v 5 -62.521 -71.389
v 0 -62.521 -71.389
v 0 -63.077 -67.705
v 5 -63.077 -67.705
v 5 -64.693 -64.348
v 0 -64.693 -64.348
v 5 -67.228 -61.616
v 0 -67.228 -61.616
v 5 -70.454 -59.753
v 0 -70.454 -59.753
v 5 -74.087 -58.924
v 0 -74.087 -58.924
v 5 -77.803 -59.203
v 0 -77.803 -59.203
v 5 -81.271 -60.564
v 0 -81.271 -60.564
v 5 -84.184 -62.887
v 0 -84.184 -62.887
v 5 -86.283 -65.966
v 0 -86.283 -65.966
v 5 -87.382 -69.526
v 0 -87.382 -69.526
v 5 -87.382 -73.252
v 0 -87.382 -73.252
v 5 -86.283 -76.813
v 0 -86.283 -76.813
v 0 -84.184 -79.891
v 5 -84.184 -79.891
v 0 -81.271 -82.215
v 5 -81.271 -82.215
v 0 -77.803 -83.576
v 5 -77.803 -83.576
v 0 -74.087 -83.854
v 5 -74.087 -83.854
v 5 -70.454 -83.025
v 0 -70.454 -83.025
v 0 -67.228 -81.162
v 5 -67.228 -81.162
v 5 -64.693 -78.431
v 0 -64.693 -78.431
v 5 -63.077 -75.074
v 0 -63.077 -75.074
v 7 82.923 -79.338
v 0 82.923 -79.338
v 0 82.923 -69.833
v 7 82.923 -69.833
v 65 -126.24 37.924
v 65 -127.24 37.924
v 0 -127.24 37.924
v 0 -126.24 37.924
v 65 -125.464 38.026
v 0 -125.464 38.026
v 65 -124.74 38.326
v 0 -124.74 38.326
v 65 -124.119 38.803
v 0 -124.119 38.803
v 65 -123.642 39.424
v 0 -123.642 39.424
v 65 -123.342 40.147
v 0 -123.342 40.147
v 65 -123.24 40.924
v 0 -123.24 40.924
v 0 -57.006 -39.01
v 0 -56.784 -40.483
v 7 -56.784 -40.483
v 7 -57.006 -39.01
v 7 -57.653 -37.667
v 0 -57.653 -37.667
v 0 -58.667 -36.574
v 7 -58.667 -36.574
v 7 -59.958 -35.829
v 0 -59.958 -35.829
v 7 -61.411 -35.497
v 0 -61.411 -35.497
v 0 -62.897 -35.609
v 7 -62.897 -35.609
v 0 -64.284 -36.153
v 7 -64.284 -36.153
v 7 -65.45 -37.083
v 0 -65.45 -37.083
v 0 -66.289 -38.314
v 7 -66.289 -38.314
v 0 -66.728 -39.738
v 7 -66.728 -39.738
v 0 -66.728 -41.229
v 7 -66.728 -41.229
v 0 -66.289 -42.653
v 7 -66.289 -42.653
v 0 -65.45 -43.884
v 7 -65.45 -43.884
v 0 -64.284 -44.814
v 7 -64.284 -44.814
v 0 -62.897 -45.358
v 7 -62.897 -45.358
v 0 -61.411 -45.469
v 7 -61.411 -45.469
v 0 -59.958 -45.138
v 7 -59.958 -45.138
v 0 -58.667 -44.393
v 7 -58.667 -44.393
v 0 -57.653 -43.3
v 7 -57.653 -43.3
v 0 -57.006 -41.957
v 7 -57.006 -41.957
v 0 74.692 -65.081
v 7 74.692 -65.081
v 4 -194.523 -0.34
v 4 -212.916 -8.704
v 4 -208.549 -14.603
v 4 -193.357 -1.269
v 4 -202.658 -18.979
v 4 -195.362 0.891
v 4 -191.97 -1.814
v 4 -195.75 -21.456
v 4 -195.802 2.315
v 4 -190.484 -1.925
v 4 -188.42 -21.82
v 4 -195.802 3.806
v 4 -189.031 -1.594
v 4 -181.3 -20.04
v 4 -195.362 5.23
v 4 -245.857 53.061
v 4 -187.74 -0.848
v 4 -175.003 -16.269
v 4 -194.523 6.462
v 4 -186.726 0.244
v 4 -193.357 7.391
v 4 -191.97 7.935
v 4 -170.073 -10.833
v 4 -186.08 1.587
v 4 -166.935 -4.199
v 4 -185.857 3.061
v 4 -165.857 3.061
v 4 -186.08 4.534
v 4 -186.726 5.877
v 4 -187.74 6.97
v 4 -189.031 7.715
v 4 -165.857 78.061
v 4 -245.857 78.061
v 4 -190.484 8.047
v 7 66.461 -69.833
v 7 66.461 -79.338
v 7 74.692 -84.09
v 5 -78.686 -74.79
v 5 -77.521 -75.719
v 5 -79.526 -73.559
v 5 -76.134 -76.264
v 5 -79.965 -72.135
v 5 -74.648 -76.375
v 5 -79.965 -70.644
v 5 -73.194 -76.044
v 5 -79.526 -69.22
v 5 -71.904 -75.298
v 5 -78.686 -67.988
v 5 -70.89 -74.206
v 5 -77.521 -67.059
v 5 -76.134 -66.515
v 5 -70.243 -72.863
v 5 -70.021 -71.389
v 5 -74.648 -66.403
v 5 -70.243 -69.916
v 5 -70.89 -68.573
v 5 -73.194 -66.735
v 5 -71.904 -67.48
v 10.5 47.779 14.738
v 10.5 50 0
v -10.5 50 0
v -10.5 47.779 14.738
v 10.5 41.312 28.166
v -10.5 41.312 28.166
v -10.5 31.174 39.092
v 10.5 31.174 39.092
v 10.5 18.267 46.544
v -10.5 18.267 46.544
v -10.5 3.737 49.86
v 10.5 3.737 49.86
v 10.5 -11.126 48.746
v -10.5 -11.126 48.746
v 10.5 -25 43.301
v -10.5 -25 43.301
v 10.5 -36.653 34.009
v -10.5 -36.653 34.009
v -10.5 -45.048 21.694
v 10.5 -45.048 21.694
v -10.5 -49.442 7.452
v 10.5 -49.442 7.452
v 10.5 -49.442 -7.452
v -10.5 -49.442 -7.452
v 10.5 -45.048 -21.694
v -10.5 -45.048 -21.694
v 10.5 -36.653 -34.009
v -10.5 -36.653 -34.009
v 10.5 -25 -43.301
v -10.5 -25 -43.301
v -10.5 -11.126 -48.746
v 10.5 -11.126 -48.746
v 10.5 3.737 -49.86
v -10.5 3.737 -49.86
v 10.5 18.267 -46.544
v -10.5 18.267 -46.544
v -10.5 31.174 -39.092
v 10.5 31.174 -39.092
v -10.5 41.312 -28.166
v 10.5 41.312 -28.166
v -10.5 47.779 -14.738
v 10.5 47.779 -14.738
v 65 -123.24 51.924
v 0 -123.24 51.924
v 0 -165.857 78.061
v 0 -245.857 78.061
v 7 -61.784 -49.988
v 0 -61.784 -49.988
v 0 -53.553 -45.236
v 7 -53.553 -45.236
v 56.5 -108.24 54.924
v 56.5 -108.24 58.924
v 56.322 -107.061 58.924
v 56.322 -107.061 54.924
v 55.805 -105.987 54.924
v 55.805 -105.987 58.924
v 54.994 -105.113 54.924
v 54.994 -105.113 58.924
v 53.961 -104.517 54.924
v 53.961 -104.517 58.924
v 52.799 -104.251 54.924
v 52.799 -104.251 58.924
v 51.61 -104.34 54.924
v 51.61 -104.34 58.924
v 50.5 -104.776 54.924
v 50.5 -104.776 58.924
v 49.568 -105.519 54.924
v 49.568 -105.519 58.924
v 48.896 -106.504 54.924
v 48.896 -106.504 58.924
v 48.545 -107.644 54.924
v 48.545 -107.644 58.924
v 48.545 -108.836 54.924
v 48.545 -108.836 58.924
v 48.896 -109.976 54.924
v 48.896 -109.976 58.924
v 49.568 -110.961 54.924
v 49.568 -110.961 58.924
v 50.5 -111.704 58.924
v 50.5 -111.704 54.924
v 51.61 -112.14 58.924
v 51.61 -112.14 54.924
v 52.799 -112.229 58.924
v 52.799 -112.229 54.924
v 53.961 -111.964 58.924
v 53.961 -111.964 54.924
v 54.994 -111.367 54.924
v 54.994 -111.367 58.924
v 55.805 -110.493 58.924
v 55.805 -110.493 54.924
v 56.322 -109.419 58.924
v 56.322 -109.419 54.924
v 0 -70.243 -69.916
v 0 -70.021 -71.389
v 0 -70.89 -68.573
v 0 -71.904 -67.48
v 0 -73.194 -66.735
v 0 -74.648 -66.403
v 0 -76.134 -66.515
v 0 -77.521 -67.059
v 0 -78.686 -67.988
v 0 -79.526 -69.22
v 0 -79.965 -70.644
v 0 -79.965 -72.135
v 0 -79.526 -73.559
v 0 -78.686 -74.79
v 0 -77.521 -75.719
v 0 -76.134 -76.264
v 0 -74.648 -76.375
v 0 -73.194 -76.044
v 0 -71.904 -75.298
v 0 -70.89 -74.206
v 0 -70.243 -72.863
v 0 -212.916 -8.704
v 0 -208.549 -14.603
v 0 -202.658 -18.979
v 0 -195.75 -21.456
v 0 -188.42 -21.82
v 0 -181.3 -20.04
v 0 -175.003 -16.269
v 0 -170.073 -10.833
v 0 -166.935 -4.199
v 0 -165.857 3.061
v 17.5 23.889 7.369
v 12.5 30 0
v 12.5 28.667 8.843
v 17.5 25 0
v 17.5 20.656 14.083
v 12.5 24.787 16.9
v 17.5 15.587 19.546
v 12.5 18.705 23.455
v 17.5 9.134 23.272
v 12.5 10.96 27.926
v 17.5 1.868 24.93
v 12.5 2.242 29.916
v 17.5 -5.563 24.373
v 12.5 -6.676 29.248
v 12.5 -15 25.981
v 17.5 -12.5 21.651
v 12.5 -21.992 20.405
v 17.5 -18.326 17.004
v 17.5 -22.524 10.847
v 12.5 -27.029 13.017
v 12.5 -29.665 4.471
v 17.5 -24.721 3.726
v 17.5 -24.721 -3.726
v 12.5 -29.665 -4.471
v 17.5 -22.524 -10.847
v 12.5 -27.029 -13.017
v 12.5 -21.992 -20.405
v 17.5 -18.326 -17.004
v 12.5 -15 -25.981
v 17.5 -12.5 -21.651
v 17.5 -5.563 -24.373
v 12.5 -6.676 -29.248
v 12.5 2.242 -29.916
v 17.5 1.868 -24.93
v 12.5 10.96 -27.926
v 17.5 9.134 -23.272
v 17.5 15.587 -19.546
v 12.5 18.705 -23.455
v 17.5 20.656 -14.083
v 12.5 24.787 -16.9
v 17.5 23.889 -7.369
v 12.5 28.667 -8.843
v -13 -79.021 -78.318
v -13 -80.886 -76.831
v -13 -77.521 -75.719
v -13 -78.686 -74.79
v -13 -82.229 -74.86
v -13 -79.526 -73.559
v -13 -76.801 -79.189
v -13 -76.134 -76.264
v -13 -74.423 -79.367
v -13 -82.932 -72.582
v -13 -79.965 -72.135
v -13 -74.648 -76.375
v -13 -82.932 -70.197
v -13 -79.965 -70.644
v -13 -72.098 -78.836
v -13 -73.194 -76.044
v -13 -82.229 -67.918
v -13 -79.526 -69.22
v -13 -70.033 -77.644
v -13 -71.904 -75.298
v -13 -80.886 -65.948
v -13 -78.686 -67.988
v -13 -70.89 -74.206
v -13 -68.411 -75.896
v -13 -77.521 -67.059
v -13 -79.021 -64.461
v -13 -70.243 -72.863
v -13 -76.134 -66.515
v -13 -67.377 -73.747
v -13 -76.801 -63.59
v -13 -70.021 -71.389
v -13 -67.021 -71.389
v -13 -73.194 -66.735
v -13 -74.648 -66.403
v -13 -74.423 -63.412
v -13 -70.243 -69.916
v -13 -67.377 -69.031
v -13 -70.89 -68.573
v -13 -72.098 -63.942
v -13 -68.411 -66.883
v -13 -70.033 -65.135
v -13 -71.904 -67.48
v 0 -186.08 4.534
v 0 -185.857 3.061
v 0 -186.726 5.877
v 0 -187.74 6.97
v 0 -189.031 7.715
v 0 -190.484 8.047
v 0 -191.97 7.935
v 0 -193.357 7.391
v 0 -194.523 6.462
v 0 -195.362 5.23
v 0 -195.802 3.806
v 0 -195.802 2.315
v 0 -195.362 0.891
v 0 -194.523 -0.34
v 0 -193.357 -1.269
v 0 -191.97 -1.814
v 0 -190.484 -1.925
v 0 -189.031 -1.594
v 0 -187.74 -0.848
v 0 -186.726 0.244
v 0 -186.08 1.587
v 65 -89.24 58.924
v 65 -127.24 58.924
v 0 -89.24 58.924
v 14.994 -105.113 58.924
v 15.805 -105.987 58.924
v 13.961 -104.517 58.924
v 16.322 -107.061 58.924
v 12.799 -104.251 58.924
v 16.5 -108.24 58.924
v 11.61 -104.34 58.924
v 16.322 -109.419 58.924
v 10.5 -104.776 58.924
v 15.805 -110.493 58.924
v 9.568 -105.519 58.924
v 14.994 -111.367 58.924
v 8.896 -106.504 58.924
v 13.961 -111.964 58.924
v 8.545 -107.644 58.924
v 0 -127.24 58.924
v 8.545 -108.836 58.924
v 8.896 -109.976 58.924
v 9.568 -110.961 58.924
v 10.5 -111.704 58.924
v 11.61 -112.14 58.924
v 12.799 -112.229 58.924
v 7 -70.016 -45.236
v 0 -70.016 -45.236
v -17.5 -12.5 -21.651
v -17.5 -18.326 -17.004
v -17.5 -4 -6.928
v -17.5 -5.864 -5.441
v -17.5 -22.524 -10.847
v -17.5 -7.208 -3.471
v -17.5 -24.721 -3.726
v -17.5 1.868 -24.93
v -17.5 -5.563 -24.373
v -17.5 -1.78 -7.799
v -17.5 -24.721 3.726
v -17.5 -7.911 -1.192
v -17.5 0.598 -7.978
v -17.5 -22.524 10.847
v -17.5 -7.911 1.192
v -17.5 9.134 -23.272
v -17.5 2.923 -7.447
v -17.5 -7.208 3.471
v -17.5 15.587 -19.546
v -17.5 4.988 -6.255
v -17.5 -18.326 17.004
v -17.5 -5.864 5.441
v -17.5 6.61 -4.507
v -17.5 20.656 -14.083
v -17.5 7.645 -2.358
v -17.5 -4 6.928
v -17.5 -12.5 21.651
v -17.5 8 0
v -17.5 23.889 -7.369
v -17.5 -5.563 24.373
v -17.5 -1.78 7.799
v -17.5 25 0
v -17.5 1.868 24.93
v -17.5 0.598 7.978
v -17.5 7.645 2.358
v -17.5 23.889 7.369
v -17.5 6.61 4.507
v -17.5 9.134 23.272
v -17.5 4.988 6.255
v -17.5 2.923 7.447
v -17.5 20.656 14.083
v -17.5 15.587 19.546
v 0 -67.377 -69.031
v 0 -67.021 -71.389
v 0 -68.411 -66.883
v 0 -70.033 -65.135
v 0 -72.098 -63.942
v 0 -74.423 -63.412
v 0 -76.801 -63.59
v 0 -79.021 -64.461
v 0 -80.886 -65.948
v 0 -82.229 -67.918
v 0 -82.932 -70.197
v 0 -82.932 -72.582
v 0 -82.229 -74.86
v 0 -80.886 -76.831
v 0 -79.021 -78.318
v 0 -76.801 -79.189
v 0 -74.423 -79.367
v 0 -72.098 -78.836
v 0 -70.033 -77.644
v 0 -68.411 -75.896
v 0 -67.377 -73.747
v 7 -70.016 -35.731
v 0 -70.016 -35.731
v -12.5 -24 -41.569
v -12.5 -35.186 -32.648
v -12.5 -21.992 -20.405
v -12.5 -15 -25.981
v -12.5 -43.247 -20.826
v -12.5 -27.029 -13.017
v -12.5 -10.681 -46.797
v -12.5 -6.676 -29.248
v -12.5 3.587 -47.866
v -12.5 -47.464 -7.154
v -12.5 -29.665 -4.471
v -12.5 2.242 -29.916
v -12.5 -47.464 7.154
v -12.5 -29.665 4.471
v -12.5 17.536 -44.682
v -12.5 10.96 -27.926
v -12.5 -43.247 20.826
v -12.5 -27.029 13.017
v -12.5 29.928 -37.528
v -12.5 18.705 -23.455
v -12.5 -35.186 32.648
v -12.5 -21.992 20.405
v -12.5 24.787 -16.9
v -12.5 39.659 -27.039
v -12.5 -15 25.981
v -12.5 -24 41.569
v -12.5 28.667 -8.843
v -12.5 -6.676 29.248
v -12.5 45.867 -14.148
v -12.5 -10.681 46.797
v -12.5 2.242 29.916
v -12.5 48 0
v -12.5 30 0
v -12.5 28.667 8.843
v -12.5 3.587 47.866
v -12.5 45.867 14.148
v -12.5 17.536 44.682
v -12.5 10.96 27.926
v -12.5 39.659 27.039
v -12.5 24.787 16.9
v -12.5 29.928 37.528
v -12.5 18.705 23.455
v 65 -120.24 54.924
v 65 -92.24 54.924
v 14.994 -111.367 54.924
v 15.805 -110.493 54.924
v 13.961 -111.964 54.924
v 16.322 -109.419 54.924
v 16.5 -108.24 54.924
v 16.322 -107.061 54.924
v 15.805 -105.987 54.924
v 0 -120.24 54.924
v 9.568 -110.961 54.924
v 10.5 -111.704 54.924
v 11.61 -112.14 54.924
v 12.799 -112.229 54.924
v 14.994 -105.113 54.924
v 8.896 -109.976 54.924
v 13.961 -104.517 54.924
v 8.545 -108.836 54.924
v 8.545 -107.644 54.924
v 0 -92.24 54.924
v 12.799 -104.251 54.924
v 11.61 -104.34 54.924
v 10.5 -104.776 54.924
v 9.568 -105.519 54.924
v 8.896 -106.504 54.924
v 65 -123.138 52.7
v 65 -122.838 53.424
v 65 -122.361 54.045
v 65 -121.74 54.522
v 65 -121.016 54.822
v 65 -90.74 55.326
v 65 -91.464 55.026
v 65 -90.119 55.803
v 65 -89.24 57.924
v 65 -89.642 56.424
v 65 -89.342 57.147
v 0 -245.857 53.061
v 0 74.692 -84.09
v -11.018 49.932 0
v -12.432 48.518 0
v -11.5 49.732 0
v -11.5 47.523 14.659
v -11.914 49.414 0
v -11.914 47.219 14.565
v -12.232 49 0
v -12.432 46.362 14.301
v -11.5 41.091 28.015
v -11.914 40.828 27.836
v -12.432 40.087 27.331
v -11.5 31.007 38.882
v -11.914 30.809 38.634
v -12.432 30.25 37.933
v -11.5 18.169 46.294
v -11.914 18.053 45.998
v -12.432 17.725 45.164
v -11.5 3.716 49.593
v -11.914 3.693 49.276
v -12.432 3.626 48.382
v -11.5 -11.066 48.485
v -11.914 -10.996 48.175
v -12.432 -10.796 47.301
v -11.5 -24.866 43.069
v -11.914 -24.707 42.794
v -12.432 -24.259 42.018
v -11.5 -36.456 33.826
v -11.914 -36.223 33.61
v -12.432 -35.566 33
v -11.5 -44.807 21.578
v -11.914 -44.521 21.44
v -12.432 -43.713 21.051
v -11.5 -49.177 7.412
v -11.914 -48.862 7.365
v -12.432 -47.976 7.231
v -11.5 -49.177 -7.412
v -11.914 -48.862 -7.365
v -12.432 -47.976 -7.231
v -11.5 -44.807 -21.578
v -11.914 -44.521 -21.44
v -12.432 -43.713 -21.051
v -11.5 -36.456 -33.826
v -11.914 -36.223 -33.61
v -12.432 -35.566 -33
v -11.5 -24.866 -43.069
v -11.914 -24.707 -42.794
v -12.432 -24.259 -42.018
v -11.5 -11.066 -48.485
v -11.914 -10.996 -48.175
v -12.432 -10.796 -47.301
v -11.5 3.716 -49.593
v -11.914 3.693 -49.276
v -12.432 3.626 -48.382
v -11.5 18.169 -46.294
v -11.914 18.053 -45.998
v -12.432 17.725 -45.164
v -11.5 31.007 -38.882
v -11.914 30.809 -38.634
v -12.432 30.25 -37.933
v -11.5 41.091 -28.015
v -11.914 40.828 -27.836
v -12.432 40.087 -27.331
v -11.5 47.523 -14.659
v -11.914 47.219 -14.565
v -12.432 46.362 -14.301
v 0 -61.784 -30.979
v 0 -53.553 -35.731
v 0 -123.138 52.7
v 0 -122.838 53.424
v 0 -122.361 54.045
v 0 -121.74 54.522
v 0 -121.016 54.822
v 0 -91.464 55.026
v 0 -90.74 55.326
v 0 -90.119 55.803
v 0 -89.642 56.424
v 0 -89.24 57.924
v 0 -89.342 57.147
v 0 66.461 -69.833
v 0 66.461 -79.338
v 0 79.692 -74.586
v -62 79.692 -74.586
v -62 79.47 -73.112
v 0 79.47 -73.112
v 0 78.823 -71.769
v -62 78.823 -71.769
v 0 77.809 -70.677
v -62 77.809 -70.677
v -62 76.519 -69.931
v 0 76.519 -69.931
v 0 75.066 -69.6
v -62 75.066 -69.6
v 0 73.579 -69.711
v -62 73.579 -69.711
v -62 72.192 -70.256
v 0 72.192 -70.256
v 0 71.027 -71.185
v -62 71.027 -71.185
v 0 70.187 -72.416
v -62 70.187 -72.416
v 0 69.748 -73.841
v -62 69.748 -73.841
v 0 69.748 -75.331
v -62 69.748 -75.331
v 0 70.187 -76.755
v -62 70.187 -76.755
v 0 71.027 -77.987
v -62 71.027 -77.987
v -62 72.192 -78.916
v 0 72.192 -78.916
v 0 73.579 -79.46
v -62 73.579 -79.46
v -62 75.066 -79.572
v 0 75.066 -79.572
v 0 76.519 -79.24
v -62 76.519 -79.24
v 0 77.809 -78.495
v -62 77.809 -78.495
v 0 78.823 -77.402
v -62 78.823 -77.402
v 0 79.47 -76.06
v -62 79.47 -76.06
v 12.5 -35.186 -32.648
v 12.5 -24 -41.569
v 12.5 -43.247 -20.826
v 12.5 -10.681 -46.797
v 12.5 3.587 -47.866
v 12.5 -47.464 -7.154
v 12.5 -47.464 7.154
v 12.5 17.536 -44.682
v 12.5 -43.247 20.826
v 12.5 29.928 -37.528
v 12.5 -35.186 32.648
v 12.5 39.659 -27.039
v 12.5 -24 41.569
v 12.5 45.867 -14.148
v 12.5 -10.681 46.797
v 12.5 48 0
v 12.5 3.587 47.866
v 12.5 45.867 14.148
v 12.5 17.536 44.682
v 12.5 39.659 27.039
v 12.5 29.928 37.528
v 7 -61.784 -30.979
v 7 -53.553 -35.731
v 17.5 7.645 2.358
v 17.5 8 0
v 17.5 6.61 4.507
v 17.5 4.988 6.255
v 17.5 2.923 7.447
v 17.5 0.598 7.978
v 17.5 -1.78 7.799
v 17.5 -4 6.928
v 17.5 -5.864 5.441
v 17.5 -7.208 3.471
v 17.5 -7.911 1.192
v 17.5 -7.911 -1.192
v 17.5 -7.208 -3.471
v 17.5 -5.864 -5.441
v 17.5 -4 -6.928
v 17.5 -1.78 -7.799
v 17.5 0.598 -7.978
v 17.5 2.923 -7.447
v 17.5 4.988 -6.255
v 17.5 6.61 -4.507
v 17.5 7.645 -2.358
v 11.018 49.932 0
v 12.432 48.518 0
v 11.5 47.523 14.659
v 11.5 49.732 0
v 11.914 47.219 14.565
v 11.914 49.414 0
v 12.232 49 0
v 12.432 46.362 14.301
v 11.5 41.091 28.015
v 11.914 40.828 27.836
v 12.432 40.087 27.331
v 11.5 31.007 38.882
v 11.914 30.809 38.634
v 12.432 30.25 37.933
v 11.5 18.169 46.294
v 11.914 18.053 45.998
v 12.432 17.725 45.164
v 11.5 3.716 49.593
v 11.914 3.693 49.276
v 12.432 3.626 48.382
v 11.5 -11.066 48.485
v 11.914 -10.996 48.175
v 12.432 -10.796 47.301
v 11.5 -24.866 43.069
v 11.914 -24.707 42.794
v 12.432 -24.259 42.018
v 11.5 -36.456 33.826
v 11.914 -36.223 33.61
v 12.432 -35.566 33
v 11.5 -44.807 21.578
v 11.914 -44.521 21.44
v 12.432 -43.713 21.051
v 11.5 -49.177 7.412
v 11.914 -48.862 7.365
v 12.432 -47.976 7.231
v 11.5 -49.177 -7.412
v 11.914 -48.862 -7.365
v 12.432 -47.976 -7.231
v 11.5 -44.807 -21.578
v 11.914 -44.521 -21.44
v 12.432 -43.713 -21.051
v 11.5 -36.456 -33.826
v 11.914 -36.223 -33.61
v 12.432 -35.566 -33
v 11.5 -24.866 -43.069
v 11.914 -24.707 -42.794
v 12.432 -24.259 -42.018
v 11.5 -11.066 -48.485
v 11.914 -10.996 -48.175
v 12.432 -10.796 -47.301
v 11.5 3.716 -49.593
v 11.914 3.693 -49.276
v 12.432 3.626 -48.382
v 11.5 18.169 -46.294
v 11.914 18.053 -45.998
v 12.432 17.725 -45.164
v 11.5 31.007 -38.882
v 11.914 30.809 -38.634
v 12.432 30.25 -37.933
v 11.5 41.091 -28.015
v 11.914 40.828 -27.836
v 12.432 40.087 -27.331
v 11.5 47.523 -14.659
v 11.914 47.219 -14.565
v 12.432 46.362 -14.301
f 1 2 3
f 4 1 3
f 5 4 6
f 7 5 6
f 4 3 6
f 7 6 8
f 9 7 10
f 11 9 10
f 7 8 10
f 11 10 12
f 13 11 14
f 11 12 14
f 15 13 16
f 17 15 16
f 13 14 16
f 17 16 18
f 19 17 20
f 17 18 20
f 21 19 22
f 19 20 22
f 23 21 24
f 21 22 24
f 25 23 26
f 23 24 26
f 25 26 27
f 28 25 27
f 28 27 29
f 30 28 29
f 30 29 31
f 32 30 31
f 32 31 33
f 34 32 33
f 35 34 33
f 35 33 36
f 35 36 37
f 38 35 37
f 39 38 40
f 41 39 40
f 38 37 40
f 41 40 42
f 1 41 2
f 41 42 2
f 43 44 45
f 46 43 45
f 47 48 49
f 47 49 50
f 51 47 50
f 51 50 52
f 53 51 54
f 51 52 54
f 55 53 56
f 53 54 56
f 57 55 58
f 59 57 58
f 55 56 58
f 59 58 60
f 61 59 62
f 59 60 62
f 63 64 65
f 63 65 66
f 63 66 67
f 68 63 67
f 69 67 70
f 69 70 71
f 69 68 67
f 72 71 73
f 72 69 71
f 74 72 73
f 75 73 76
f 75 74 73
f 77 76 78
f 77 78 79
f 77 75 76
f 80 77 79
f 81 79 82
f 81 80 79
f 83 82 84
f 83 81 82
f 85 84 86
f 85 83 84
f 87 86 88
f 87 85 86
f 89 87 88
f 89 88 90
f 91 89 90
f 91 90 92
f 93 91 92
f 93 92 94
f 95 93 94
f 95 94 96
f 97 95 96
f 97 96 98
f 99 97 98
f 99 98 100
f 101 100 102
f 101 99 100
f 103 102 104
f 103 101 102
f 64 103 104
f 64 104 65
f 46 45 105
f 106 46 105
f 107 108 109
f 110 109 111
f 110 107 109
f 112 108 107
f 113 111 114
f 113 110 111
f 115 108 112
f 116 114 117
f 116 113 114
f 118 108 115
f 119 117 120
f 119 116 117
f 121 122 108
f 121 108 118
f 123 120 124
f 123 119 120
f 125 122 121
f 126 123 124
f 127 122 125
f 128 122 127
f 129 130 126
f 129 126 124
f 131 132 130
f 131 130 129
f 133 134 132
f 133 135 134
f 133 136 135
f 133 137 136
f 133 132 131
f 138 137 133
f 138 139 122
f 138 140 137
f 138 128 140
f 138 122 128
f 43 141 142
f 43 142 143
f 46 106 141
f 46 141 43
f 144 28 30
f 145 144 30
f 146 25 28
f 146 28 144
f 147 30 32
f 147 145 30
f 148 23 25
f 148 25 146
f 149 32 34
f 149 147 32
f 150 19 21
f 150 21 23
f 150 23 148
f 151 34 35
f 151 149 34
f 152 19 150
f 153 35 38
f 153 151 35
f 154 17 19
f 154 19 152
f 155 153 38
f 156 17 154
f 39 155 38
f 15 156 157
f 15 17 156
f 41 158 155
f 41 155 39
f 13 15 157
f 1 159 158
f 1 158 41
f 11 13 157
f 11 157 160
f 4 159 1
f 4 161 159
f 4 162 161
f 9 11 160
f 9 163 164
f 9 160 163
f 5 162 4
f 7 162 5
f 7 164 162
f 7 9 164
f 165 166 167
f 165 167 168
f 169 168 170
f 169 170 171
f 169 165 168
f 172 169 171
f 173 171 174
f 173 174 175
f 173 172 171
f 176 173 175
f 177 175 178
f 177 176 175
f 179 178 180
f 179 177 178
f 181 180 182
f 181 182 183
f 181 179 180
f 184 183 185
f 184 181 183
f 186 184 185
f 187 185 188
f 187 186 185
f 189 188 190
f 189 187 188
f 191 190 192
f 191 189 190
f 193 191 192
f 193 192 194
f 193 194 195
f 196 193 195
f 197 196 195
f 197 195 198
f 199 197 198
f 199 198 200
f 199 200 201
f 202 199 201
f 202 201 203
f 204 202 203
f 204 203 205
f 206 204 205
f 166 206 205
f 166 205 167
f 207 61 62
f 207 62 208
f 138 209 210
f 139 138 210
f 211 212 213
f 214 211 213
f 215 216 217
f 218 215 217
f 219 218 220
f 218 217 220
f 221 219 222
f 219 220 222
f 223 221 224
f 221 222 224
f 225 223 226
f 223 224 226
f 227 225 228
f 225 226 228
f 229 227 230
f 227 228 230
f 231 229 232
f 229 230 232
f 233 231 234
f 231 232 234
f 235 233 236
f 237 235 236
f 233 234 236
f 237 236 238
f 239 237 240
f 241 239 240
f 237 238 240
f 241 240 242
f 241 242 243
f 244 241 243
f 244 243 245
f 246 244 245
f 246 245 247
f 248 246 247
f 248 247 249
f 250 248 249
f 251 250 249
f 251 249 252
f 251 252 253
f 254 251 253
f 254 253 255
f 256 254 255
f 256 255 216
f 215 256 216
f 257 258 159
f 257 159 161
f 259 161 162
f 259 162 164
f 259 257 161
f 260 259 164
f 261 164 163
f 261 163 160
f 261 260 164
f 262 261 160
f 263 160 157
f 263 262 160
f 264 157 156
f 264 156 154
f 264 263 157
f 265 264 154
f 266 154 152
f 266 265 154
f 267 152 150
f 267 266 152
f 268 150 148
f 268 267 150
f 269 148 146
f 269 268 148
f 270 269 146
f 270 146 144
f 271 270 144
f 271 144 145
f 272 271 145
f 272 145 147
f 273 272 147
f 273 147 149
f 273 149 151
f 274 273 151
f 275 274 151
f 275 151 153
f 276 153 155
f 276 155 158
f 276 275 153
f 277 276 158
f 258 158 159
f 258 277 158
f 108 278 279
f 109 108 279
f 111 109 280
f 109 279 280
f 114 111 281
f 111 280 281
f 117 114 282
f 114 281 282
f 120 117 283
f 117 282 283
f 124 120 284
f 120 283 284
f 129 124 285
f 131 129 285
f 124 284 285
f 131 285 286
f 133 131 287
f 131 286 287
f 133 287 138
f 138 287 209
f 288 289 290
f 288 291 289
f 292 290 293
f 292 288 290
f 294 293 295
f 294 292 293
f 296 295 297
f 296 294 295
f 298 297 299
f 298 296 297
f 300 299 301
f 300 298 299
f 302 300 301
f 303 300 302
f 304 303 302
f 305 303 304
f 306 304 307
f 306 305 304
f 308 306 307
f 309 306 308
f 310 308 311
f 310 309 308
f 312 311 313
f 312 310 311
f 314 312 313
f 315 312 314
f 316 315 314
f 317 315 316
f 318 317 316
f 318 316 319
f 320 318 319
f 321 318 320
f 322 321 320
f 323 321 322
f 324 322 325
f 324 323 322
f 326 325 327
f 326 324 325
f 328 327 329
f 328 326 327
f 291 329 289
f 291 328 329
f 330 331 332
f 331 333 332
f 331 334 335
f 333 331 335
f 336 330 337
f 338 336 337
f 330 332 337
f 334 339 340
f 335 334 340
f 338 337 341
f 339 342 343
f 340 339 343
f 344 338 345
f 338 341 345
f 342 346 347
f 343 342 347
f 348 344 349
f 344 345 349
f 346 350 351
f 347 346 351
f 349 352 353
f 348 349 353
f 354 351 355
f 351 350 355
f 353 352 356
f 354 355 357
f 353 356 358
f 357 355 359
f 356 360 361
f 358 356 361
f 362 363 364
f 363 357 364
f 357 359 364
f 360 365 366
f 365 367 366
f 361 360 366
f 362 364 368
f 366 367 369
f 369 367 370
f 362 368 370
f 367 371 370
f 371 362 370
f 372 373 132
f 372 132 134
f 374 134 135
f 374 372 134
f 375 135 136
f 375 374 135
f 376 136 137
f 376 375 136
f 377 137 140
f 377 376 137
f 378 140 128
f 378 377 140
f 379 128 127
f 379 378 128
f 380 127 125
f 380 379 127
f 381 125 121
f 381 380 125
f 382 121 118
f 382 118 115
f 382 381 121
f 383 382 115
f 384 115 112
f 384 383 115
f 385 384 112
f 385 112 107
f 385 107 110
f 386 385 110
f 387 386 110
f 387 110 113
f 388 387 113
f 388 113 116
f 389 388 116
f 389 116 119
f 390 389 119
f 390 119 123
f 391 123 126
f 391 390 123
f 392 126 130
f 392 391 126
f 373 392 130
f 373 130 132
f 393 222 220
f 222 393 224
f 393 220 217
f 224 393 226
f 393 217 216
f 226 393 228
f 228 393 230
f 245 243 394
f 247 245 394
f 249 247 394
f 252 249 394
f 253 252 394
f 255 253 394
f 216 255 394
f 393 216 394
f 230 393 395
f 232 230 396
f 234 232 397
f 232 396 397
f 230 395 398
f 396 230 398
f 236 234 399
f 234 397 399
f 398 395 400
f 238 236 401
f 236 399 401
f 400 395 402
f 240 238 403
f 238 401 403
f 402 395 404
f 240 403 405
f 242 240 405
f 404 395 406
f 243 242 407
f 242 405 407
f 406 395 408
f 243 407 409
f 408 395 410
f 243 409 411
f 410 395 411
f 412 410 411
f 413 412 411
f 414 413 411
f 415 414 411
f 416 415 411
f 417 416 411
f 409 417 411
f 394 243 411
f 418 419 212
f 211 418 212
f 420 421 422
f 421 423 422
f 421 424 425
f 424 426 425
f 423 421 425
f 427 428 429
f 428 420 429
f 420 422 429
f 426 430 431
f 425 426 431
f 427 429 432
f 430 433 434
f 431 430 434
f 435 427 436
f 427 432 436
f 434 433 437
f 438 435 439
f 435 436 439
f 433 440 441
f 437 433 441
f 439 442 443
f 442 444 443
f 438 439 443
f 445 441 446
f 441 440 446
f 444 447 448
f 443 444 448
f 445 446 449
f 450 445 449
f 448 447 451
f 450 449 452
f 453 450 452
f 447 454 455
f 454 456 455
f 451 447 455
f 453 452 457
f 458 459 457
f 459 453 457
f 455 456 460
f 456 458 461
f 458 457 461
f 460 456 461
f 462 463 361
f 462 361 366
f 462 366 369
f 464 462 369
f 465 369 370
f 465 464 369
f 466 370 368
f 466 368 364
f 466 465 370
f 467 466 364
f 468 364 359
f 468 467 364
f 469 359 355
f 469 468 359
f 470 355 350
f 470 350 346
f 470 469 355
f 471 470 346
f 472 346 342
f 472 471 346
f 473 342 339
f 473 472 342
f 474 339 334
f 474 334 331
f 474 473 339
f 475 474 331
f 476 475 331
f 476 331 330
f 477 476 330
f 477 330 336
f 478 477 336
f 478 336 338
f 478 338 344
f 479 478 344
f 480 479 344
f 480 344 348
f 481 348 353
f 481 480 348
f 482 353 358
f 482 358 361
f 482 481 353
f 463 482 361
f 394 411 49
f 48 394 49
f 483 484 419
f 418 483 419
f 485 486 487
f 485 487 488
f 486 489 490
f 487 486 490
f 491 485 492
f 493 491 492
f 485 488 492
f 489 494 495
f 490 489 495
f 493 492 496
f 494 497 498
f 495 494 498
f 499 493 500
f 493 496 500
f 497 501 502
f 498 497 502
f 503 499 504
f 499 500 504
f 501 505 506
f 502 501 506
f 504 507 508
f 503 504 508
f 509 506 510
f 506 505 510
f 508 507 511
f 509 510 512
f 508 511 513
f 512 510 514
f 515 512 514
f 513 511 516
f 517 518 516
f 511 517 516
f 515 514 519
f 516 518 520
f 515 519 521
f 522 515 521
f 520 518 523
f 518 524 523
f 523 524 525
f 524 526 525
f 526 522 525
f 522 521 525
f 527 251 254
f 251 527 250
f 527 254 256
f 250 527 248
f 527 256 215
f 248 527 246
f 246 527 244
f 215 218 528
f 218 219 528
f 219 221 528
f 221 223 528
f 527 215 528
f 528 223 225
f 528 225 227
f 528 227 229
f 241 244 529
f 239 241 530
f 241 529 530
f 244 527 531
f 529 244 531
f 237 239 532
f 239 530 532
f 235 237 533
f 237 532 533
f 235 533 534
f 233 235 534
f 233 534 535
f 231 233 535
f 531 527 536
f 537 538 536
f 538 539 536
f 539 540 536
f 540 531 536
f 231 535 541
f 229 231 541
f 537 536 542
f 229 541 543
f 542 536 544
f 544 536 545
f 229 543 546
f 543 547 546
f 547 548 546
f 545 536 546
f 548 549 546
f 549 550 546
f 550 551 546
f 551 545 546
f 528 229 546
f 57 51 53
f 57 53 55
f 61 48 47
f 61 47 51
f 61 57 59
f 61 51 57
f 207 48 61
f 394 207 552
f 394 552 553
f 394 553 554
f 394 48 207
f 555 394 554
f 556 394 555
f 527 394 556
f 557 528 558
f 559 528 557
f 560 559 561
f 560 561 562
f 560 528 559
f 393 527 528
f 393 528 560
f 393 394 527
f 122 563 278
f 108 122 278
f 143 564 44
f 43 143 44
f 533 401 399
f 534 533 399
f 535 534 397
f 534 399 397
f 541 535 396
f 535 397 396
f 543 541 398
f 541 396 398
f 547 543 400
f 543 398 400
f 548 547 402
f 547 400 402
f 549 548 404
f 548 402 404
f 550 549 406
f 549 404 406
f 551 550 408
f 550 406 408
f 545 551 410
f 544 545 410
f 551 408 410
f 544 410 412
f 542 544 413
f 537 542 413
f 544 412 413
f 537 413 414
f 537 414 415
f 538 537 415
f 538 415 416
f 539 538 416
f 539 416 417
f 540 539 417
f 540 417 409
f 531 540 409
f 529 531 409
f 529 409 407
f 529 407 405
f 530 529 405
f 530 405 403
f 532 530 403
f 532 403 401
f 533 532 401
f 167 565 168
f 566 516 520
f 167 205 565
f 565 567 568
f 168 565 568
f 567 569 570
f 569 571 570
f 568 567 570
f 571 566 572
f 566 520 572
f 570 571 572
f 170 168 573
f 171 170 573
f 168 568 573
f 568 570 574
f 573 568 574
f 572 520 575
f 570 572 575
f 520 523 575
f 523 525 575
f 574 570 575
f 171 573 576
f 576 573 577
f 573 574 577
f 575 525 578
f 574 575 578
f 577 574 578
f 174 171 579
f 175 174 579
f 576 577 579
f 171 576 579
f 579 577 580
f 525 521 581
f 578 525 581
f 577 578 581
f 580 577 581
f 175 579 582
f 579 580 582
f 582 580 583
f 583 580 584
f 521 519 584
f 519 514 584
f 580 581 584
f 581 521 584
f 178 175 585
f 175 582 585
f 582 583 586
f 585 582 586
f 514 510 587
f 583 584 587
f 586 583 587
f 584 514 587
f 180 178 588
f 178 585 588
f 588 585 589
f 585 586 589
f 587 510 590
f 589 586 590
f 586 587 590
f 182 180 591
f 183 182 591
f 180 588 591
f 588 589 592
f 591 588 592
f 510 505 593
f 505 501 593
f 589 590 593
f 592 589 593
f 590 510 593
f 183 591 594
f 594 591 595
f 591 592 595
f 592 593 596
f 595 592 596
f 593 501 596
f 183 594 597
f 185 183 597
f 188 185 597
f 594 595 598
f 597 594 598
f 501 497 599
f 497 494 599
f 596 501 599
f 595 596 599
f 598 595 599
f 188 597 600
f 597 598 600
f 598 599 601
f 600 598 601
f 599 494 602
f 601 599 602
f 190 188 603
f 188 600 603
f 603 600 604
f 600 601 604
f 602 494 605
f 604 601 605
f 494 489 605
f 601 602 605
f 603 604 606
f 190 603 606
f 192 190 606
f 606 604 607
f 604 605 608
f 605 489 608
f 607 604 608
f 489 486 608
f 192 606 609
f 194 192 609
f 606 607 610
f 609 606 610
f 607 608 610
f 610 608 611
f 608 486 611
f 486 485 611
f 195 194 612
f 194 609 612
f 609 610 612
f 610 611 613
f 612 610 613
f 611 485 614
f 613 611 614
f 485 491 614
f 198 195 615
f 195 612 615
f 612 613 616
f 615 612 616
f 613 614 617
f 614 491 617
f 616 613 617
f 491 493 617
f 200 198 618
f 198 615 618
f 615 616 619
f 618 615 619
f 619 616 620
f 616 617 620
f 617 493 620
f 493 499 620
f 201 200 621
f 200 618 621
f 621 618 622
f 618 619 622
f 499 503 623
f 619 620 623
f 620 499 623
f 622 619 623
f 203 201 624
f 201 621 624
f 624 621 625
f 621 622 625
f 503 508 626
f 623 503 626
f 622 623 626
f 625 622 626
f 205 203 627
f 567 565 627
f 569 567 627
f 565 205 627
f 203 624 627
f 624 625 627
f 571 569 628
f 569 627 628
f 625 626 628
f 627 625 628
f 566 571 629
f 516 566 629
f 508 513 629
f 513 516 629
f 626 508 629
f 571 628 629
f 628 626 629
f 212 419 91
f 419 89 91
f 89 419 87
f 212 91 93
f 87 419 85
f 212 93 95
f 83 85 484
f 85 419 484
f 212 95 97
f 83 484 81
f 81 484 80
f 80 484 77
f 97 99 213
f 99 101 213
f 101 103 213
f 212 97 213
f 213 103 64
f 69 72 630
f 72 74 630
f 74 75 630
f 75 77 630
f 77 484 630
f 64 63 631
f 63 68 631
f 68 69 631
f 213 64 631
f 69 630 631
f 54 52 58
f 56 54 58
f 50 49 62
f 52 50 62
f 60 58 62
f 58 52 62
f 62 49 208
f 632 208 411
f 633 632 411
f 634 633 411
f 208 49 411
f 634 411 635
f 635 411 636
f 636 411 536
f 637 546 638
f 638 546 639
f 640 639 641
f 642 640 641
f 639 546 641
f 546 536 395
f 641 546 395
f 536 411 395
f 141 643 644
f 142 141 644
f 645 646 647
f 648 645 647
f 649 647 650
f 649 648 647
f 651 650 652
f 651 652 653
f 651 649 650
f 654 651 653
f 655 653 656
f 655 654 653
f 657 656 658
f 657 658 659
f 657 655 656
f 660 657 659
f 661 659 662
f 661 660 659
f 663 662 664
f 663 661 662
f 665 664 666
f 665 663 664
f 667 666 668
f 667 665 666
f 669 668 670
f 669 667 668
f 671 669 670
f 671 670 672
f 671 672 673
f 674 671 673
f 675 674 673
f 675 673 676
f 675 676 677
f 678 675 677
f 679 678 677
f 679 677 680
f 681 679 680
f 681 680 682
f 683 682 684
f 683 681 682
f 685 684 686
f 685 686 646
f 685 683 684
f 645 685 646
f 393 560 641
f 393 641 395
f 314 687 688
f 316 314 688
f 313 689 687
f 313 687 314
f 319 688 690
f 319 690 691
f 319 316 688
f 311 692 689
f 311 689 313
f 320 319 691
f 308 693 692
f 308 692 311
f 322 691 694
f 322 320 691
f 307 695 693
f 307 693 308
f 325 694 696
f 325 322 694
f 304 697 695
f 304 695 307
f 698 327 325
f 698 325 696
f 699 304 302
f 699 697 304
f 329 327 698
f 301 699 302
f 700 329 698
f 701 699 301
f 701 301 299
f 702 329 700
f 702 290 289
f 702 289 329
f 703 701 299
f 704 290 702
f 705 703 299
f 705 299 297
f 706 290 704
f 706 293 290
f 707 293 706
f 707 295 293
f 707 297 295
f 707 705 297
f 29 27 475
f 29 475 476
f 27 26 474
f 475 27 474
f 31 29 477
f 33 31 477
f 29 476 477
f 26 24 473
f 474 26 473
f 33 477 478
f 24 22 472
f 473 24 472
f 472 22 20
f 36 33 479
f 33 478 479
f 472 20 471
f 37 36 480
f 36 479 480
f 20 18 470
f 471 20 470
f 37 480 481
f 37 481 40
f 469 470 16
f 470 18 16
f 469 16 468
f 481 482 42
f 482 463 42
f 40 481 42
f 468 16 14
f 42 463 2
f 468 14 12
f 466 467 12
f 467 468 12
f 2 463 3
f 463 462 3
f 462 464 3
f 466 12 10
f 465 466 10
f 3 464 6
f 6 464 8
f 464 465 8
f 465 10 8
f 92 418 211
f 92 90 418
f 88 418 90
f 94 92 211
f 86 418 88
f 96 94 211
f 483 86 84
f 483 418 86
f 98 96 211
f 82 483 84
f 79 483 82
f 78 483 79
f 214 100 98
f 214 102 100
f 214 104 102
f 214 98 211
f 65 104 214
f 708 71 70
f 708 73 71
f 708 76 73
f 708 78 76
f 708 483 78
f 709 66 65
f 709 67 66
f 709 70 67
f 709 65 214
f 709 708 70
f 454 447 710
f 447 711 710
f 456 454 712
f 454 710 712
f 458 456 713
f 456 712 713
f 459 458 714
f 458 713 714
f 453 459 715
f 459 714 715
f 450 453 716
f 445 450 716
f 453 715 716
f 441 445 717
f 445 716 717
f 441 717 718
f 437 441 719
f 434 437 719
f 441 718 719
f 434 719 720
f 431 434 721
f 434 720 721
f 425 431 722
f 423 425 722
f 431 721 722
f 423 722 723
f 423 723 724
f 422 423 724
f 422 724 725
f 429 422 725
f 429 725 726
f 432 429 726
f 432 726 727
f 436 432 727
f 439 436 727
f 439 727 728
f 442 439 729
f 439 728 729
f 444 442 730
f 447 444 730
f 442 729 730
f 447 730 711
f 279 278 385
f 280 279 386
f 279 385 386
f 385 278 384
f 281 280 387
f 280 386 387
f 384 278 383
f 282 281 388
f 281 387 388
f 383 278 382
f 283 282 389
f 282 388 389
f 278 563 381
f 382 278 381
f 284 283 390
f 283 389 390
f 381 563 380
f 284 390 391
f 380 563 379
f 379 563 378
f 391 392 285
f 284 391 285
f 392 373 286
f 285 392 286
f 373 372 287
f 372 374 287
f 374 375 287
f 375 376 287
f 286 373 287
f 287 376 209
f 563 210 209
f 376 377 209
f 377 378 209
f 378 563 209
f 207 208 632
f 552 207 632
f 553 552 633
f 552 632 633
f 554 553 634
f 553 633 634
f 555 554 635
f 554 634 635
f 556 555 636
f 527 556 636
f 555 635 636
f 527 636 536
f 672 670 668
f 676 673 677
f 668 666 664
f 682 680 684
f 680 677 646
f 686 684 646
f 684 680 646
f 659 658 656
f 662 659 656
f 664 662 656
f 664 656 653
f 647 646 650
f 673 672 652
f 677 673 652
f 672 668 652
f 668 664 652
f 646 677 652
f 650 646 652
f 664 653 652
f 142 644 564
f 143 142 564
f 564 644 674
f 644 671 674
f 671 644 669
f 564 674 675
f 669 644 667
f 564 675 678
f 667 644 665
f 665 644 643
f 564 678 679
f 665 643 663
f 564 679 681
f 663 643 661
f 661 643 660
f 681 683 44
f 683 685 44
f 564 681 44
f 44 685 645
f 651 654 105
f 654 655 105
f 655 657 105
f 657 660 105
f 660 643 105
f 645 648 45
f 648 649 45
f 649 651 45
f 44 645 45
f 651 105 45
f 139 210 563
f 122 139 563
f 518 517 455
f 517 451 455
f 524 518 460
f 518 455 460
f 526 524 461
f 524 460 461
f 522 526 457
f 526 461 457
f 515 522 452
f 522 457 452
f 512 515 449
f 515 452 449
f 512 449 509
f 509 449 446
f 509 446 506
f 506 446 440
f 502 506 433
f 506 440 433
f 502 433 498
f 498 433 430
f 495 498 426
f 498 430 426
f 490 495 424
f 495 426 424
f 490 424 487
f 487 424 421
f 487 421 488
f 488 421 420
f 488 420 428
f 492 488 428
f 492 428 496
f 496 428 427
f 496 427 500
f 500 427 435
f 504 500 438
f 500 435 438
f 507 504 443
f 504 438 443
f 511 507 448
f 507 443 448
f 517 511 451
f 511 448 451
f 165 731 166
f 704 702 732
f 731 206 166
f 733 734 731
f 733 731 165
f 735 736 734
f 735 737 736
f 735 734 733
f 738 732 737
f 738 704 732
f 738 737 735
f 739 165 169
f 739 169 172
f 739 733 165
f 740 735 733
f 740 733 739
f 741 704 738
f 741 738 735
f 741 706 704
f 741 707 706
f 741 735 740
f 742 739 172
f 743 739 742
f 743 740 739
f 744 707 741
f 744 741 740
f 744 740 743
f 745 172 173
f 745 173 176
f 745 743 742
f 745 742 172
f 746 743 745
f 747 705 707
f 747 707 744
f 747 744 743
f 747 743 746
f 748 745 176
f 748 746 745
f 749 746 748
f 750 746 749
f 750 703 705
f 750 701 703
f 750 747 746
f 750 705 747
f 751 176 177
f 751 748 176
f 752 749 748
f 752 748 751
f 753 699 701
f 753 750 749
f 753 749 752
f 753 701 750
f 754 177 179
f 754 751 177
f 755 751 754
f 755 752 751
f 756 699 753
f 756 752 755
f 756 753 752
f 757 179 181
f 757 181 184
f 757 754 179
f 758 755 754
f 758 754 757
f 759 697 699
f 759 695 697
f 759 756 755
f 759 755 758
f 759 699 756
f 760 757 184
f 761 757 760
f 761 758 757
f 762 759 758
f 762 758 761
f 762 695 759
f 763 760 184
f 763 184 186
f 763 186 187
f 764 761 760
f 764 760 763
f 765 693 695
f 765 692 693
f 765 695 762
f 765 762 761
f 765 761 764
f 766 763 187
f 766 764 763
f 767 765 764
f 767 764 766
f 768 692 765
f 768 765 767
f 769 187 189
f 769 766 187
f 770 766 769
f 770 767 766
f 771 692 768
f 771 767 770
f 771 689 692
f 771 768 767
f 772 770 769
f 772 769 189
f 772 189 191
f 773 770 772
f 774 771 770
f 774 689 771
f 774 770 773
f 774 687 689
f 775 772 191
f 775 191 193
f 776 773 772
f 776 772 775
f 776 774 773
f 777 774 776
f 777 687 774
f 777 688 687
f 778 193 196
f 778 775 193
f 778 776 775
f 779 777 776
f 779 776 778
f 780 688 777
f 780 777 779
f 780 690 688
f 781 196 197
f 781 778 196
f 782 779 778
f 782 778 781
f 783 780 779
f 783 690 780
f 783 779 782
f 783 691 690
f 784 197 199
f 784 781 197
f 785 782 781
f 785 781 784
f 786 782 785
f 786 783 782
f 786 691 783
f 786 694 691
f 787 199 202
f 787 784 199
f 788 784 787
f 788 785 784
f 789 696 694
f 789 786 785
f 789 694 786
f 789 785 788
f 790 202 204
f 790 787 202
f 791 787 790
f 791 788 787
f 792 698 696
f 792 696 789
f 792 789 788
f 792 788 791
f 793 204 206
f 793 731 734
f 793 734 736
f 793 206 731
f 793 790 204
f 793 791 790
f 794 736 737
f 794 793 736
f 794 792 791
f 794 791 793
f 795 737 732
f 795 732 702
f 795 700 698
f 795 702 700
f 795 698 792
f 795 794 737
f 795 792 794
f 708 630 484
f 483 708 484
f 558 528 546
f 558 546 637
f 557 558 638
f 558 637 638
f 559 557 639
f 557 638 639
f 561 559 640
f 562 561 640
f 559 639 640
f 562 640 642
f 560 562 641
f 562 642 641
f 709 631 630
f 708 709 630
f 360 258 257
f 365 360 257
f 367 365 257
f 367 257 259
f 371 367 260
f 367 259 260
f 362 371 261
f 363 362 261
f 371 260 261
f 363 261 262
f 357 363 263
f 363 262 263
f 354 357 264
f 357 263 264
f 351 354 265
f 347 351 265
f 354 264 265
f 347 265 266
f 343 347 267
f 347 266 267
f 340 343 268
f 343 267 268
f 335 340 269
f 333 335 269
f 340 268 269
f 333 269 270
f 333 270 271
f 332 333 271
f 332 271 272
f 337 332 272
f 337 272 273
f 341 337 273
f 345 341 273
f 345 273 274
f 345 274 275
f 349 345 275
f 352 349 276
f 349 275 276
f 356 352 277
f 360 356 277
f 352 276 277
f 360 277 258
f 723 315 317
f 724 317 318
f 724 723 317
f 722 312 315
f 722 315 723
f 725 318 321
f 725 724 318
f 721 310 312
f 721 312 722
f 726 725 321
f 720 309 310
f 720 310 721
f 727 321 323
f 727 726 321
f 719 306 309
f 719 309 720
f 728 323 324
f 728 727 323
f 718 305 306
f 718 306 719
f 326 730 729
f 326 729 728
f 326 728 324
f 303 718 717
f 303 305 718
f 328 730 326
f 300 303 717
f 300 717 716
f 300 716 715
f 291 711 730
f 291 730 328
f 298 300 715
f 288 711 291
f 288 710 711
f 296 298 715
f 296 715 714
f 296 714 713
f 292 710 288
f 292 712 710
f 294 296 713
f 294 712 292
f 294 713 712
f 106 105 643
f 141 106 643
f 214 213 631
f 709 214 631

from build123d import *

# Parameters (mm, degrees)
F0_R          = 50
F1_DEPTH      = 12.5
F2_R          = 30
F3_DEPTH      = 5
F3_TAPER      = 45
F4_R          = 2
F5_R          = 8
F6_DEPTH      = 17.5010001
F6_DEPTH_BACK = 17.5010001
F7_R          = 12.5
F7_R_2        = 8
F7_R_3        = 5
F8_DEPTH      = 5
F9_DEPTH      = 13
F10_R         = 5
F11_DEPTH     = 7
F12_DEPTH     = 62
F13_R         = 5
F14_DEPTH     = 7
F15_R         = 5
F16_DEPTH     = 4
F18_DEPTH     = 65
F19_R         = 4
F20_DEPTH     = 25


# Not quite as in the source:
# - a pattern or mirror of a feature is missing from the dataset's text; its kind, count and spacing are read off the source's solid


with BuildPart() as f1:
    # F0 (on Right) → F1 (new body, symmetric)
    with BuildSketch(Plane.YZ):
        Circle(F0_R)
    extrude(amount=F1_DEPTH, both=True)

    # F2 (on face) → F3 (join)
    with BuildSketch(Plane.YZ.offset(12.5)):
        Circle(F2_R)
    f3 = extrude(amount=F3_DEPTH, taper=F3_TAPER)

    # F3_copies: F3 across plane
    add(f3.mirror(Plane(origin=(0, 0, 0), x_dir=(0, 0, -1), z_dir=(-1, 0, 0))))

    # F4
    f4_edges = [f1.edges().sort_by_distance(p)[0] for p in [
        (12.5, -50, 0),
        (-12.5, -50, 0),
    ]]
    fillet(f4_edges, radius=F4_R)

    # F5 (on Right) → F6 (cut, two sides)
    with BuildSketch(Plane.YZ) as f6_sk:
        Circle(F5_R)
    extrude(amount=-F6_DEPTH, mode=Mode.SUBTRACT)
    extrude(f6_sk.sketch, amount=F6_DEPTH_BACK, mode=Mode.SUBTRACT)


with BuildPart() as f8:
    # F7 (on Right) → F8 (new body)
    with BuildSketch(Plane.YZ):
        with Locations((-75.0211775303, -71.3893398643)):
            Circle(F7_R)
        with Locations((-75.0211775303, -71.3893398643)):
            Circle(F7_R_2, mode=Mode.SUBTRACT)
        with Locations((-75.0211775303, -71.3893398643)):
            Circle(F7_R_2)
        with Locations((-75.0211775303, -71.3893398643)):
            Circle(F7_R_3, mode=Mode.SUBTRACT)
    extrude(amount=F8_DEPTH)

    # F7 (on Right) → F9 (join)
    with BuildSketch(Plane.YZ):
        with Locations((-75.0211775303, -71.3893398643)):
            Circle(F7_R_2)
        with Locations((-75.0211775303, -71.3893398643)):
            Circle(F7_R_3, mode=Mode.SUBTRACT)
    extrude(amount=-F9_DEPTH)


with BuildPart() as f11:
    # F10 (on Right) → F11 (new body)
    with BuildSketch(Plane.YZ):
        Polygon((82.9232768221, -69.8334909976), (74.6920183301, -65.0811716914), (66.4607598381, -69.8334909976), (66.4607598381, -79.3381296098), (74.6920183301, -84.090448916), (82.9232768221, -79.3381296098), align=None)
        with Locations((74.6920183301, -74.5858103037)):
            Circle(F10_R, mode=Mode.SUBTRACT)
        with Locations((74.6920183301, -74.5858103037)):
            Circle(F10_R)
    extrude(amount=F11_DEPTH)

    # F10 (on Right) → F12 (join)
    with BuildSketch(Plane.YZ):
        with Locations((74.6920183301, -74.5858103037)):
            Circle(F10_R)
    extrude(amount=-F12_DEPTH)


with BuildPart() as f14:
    # F13 (on Right) → F14 (new body)
    with BuildSketch(Plane.YZ):
        Polygon((-53.5529885899, -35.7310755062), (-61.784247082, -30.9787562001), (-70.015505574, -35.7310755062), (-70.015505574, -45.2357141185), (-61.784247082, -49.9880334246), (-53.5529885899, -45.2357141185), align=None)
        with Locations((-61.784247082, -40.4833948123)):
            Circle(F13_R, mode=Mode.SUBTRACT)
    extrude(amount=F14_DEPTH)


with BuildPart() as f16:
    # F15 (on Right) → F16 (new body)
    with BuildSketch(Plane.YZ):
        with BuildLine():
            Line((-245.8573955297, 53.0606626533), (-212.9162190592, -8.7040432291))
            ThreePointArc((-212.9162190592, -8.7040432291), (-184.7940049038, -21.1928998503), (-165.8573955297, 3.0606626533))
            Line((-165.8573955297, 3.0606626533), (-165.8573955297, 78.0606626533))
            Line((-165.8573955297, 78.0606626533), (-245.8573955297, 78.0606626533))
            Line((-245.8573955297, 78.0606626533), (-245.8573955297, 53.0606626533))
        make_face()
        with Locations((-190.8573955297, 3.0606626533)):
            Circle(F15_R, mode=Mode.SUBTRACT)
    extrude(amount=F16_DEPTH)


with BuildPart() as f18:
    # F17 (on Right) → F18 (new body)
    with BuildSketch(Plane.YZ):
        with BuildLine():
            Line((-89.2400319576, 57.9238541722), (-89.2400319576, 58.9238541722))
            Line((-89.2400319576, 58.9238541722), (-127.2400319576, 58.9238541722))
            Line((-127.2400319576, 58.9238541722), (-127.2400319576, 37.9238541722))
            Line((-127.2400319576, 37.9238541722), (-126.2400319576, 37.9238541722))
            ThreePointArc((-126.2400319576, 37.9238541722), (-124.1187116141, 38.8025338287), (-123.2400319576, 40.9238541722))
            Line((-123.2400319576, 40.9238541722), (-123.2400319576, 51.9238541722))
            ThreePointArc((-123.2400319576, 51.9238541722), (-122.3613523012, 54.0451745158), (-120.2400319576, 54.9238541722))
            Line((-120.2400319576, 54.9238541722), (-92.2400319576, 54.9238541722))
            ThreePointArc((-92.2400319576, 54.9238541722), (-90.1187116141, 55.8025338287), (-89.2400319576, 57.9238541722))
        make_face()
    extrude(amount=F18_DEPTH)

    # F19 (on face) → F20 (cut)
    with BuildSketch(Plane.XY.offset(58.9238541722)):
        with Locations((52.5, -108.2400319576)):
            Circle(F19_R)
        with Locations((12.5, -108.2400319576)):
            Circle(F19_R)
    extrude(amount=-F20_DEPTH, mode=Mode.SUBTRACT)


solid = Compound([f1.part, f8.part, f11.part, f14.part, f16.part, f18.part])
